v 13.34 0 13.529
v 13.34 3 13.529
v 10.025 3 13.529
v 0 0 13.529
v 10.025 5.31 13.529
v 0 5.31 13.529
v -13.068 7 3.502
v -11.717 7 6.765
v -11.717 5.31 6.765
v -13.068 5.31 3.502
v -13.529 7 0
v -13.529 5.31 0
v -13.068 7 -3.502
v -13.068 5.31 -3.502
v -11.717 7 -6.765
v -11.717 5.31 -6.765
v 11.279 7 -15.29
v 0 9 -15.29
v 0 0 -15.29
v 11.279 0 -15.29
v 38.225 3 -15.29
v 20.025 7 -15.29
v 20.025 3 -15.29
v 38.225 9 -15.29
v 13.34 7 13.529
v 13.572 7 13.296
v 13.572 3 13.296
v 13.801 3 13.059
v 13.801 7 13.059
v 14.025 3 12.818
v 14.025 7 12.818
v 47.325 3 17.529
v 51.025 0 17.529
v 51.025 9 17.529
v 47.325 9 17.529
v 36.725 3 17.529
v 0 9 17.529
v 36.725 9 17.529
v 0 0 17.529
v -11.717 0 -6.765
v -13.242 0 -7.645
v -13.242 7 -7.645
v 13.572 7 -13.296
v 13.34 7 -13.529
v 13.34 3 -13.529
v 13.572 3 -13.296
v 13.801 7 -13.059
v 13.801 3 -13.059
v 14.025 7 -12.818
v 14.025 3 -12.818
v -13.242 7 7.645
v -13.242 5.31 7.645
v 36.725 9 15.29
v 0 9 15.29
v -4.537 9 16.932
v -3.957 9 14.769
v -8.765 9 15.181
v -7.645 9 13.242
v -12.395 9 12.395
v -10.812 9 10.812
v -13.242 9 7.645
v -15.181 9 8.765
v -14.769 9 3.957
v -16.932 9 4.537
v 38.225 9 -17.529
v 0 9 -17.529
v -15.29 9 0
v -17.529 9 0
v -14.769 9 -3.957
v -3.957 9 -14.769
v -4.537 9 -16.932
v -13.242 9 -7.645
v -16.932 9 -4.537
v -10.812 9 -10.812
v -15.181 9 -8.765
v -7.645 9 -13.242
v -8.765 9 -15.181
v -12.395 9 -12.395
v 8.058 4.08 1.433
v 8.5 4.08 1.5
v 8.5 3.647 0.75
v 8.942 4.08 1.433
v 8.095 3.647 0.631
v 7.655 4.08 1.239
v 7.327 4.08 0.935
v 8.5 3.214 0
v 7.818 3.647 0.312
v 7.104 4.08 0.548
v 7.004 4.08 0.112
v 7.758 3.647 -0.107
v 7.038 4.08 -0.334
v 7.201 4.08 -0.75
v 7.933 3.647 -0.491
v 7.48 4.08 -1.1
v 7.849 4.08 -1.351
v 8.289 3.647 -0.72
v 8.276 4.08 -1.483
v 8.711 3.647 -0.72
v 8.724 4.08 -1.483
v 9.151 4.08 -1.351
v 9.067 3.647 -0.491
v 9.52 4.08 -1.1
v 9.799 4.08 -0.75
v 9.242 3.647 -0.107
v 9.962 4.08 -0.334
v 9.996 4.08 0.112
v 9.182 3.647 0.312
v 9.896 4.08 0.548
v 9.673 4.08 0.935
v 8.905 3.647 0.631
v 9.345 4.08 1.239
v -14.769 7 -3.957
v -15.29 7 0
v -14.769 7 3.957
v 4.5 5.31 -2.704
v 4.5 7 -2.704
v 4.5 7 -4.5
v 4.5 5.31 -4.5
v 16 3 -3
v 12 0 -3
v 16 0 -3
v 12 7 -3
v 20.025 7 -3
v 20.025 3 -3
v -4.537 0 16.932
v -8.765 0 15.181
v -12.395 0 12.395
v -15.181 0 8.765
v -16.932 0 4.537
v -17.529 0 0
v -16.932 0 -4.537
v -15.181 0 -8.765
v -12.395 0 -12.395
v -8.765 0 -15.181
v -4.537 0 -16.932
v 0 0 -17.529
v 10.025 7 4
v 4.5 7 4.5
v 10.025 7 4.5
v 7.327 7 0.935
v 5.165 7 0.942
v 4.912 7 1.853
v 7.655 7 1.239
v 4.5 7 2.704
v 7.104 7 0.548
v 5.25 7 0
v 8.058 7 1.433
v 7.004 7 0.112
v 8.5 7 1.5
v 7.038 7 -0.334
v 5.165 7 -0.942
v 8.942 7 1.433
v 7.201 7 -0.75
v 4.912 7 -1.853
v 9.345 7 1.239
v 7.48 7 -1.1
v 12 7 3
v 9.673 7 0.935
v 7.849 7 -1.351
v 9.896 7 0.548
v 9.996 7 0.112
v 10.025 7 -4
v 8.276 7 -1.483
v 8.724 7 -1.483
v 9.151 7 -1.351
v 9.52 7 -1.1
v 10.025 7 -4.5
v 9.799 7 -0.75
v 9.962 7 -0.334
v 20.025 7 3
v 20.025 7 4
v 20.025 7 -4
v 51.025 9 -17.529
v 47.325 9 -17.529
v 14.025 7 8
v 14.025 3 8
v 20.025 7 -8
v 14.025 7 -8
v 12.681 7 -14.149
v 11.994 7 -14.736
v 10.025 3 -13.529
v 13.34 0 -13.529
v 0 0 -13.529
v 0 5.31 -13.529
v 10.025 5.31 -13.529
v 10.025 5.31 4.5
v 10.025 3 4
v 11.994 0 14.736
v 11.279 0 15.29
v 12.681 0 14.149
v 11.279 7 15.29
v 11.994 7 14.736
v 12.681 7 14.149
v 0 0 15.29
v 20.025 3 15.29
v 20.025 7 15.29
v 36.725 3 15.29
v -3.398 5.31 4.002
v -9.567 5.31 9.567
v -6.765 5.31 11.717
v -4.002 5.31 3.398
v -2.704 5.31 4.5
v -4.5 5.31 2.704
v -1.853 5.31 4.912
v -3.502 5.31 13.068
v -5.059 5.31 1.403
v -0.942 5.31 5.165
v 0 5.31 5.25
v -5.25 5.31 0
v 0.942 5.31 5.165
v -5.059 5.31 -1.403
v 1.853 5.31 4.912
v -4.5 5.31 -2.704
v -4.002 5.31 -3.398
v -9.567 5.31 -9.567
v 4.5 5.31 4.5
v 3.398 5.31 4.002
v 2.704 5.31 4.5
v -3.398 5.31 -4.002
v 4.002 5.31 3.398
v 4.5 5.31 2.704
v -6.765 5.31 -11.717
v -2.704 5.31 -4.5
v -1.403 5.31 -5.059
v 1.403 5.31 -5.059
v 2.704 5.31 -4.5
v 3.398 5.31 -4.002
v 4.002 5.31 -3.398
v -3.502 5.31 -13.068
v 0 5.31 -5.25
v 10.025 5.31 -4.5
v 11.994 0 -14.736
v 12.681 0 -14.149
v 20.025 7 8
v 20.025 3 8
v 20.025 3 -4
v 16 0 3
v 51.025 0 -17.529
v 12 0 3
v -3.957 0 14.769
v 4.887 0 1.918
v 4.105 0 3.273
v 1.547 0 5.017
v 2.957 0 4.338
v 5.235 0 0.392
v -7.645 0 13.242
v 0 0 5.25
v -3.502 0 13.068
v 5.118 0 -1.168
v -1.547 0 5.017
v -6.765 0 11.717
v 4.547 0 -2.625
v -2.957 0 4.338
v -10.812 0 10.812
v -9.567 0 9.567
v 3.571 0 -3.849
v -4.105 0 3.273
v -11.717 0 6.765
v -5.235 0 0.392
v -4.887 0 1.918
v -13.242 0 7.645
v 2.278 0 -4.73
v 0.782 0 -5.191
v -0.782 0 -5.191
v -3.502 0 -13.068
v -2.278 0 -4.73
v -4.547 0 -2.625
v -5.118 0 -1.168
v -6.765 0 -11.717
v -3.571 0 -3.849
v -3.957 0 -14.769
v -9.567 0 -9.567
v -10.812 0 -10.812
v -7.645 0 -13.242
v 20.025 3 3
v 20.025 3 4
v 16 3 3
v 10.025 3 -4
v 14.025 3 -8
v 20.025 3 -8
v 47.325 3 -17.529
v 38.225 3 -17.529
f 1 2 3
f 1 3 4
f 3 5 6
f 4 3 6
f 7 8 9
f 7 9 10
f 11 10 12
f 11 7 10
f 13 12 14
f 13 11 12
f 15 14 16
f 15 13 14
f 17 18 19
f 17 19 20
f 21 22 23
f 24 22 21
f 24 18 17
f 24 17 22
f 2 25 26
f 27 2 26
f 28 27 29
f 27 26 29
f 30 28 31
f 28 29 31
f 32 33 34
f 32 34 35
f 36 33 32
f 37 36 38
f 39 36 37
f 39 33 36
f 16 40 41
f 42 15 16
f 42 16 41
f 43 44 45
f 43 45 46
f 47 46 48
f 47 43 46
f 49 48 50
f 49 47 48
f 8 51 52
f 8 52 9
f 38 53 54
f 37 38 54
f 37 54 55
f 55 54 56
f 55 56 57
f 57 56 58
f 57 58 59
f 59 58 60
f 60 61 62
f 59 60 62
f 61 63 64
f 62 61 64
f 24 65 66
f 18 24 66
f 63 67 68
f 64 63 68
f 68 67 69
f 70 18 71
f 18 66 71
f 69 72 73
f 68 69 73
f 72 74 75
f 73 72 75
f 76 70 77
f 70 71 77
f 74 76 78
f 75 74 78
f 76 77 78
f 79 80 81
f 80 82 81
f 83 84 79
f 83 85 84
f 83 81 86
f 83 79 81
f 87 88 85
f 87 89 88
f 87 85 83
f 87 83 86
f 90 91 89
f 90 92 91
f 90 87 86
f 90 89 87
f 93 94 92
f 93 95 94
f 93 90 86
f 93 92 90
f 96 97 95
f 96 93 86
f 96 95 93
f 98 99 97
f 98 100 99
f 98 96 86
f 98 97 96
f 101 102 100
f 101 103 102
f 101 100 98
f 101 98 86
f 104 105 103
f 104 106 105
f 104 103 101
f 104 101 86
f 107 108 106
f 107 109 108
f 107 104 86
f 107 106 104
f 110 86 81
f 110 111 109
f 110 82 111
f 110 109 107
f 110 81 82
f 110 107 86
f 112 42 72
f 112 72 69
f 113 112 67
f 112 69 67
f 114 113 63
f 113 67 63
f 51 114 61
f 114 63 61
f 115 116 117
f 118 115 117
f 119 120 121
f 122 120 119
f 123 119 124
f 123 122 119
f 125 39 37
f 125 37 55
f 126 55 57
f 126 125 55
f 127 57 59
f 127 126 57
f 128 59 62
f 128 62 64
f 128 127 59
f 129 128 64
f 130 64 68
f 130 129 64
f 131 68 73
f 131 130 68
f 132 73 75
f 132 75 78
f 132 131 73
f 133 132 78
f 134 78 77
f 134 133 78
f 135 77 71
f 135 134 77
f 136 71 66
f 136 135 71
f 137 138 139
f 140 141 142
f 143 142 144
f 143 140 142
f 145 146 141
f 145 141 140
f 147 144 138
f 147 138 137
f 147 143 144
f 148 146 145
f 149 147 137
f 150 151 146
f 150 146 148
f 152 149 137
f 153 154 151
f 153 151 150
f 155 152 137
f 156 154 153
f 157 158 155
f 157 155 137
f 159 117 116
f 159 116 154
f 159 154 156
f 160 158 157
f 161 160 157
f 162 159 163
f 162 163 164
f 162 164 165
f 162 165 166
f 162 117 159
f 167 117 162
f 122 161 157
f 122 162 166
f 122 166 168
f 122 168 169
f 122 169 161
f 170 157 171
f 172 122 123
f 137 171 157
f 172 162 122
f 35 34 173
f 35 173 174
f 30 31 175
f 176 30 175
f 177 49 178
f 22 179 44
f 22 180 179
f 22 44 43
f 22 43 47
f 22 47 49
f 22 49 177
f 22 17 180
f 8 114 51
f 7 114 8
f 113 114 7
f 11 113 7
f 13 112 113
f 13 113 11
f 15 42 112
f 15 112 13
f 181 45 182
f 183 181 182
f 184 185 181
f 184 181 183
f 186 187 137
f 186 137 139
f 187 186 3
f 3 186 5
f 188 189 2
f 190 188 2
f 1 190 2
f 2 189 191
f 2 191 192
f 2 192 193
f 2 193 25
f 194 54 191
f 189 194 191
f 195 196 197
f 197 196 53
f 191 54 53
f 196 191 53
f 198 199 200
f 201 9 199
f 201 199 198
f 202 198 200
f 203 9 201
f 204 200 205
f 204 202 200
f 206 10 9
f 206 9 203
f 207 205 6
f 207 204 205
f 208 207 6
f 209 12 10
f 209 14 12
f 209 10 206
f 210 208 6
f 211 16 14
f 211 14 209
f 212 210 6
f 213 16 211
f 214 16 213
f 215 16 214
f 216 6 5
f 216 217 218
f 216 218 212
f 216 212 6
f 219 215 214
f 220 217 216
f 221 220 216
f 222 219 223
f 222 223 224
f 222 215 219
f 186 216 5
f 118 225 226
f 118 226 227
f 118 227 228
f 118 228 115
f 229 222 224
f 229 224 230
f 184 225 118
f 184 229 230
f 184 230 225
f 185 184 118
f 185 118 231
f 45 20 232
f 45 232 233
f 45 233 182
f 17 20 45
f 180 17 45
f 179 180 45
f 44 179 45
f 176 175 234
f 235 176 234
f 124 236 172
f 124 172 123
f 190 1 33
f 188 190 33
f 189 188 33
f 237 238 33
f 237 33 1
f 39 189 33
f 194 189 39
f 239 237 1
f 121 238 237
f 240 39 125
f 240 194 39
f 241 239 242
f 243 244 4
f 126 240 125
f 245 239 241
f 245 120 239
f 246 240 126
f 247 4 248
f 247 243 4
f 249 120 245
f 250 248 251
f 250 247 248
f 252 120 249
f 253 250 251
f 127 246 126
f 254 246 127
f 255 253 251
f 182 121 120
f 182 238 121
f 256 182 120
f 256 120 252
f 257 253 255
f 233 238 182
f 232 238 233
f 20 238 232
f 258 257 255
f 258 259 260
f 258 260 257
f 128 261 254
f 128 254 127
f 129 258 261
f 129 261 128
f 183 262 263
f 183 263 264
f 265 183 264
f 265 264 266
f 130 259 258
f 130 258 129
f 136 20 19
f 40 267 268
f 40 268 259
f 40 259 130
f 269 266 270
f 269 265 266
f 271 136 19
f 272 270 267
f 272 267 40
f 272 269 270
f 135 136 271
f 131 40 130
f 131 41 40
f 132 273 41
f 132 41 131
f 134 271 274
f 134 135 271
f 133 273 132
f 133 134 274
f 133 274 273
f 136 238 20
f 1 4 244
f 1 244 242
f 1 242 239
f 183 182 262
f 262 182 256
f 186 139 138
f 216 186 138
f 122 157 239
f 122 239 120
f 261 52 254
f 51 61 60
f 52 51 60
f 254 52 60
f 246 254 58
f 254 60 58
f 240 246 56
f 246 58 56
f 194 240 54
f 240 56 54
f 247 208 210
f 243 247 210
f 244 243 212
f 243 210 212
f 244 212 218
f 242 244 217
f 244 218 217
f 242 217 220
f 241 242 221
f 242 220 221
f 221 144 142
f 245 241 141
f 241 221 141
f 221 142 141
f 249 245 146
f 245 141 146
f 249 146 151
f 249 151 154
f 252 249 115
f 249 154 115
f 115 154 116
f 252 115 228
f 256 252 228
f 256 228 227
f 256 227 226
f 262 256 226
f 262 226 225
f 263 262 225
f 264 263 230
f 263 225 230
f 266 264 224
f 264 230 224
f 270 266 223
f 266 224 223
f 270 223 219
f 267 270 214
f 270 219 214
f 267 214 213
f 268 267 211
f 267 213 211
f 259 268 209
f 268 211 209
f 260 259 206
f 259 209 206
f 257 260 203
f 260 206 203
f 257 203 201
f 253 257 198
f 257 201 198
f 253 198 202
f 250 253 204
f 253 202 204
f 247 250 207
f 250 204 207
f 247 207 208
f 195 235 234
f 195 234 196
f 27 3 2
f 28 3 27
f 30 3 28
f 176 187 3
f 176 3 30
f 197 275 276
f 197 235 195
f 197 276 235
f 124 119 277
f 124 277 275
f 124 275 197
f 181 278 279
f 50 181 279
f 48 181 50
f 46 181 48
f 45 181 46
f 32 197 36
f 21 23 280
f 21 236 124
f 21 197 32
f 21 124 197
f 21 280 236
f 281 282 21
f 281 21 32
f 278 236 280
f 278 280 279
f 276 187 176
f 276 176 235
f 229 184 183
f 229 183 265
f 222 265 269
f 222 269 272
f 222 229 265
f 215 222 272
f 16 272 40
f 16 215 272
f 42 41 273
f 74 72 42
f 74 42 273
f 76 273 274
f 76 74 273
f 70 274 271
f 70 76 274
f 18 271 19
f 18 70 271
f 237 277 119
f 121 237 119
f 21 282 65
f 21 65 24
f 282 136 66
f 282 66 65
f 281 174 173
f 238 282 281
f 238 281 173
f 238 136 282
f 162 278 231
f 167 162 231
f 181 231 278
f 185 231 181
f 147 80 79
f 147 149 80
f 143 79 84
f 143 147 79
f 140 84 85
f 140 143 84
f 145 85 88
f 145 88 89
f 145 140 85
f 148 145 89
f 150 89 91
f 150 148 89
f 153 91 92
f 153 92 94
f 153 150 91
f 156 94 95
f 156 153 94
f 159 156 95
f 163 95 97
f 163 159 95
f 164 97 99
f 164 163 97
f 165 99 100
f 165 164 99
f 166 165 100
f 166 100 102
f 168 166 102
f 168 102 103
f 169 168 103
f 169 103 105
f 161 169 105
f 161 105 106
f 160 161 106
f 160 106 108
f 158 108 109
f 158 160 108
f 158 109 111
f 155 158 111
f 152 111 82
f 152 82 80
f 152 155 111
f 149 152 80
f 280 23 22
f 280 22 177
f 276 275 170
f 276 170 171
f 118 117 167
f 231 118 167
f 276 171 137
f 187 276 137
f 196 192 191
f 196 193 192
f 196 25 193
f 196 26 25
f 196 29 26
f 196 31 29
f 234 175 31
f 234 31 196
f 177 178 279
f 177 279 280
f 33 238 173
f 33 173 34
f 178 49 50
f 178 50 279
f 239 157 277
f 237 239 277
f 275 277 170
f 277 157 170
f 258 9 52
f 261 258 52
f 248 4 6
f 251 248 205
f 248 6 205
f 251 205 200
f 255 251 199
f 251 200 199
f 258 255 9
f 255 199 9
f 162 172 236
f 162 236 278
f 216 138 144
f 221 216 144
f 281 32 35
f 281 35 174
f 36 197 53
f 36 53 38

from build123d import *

# Parameters (mm, degrees)
SENSOR_BODY_BASE_DEPTH            = 9
CAMERA_HOLE_SKETCH_R              = 5.25
CAMERA_HOLE_DEPTH                 = 55.697637212
COVER_PLATE_CUTOUT_DEPTH          = 2
LED_DRIVER_CUTOUT_DEPTH           = 55.40433362
LED_DRIVER_CUTOUT_DEPTH_BACK      = 4
LEAD_START                        = 55.40433362
LEAD_CUTOUT_DEPTH                 = 62.40433362
FOLDED_LEAD_CUTOUT_DEPTH          = 4
GREEN_LEAD_CUTOUT_SKETCH_W        = 4
GREEN_LEAD_CUTOUT_SKETCH_H        = 6
GREEN_LEAD_CUTOUT_DEPTH           = 55.40433362
FOLDED_GREEN_LEAD_CUTOUT_SKETCH_W = 4.025
FOLDED_GREEN_LEAD_CUTOUT_SKETCH_H = 6
FOLDED_GREEN_LEAD_CUTOUT_DEPTH    = 4
CAMERA_PCB_CUTOUT_DEPTH           = 1.69
COVER_START                       = 1.69
COVER_PLATE_SUPPORT_DEPTH         = 1.69


with BuildPart() as part:
    # Sensor Body Base Sketch → Sensor Body Base (new body)
    with BuildSketch(Plane(origin=(0, 0, 0), x_dir=(1, 0, 0), z_dir=(0, 1, 0))):
        with BuildLine():
            Line((0, 17.5294293), (51.025, 17.5294293))
            Line((51.025, 17.5294293), (51.025, -17.5294293))
            Line((51.025, -17.5294293), (0, -17.5294293))
            ThreePointArc((0, -17.5294293), (-17.5294293, 0), (0, 17.5294293))
        make_face()
    extrude(amount=SENSOR_BODY_BASE_DEPTH)

    # Camera Hole Sketch → Camera Hole (cut, through all)
    with BuildSketch(Plane(origin=(0, 9, 0), x_dir=(1, 0, 0), z_dir=(0, 1, 0))):
        with Locations(Location((0, 0, 0), (0, 0, 270))):
            Circle(CAMERA_HOLE_SKETCH_R)
    extrude(amount=-CAMERA_HOLE_DEPTH, mode=Mode.SUBTRACT)

    # Cover Plate Cutout Sketch → Cover Plate Cutout (cut)
    # profile 1 of 2: a face of its own
    with BuildSketch(Plane(origin=(0, 9, 0), x_dir=(1, 0, 0), z_dir=(0, 1, 0))):
        with BuildLine():
            Line((47.325, 15.29), (0, 15.29))
            ThreePointArc((0, 15.29), (-15.29, 0), (0, -15.29))
            Line((0, -15.29), (47.325, -15.29))
            Line((47.325, -15.29), (47.325, -5.29))
            Line((47.325, -5.29), (47.325, 5.29))
            Line((47.325, 5.29), (47.325, 15.29))
        make_face()
        with BuildLine():
            ThreePointArc((4.308421985, -3), (-5.25, 0), (4.308421985, 3))
            Line((4.308421985, 3), (10.72655949, 3))
            Line((10.72655949, 3), (10.72655949, -3))
            Line((10.72655949, -3), (4.308421985, -3))
        make_face(mode=Mode.SUBTRACT)
    # profile 2 of 2: a face of its own
    with BuildSketch(Plane(origin=(0, 9, 0), x_dir=(1, 0, 0), z_dir=(0, 1, 0))):
        with BuildLine():
            Line((10.72655949, 3), (4.308421985, 3))
            ThreePointArc((4.308421985, 3), (5.009077531, 1.57214576), (5.25, 0))
            ThreePointArc((5.25, 0), (5.009077531, -1.57214576), (4.308421985, -3))
            Line((4.308421985, -3), (10.72655949, -3))
            Line((10.72655949, -3), (10.72655949, 3))
        make_face()
    extrude(amount=-COVER_PLATE_CUTOUT_DEPTH, mode=Mode.SUBTRACT)

    # LED Driver Cutout Sketch → LED Driver Cutout (cut, two sides: drawn at the far end of the back side and taken through both)
    with BuildSketch(Plane(origin=(0, 7, 0), x_dir=(1, 0, 0), z_dir=(0, 1, 0)).offset(-LED_DRIVER_CUTOUT_DEPTH_BACK)):
        Polygon((36.725, -17.5294293), (47.325, -17.5294293), (47.325, 17.5294293), (38.225, 17.5294293), (38.225, 15.29), (20.025, 15.29), (20.025, -15.29), (36.725, -15.29), align=None)
    extrude(amount=LED_DRIVER_CUTOUT_DEPTH + LED_DRIVER_CUTOUT_DEPTH_BACK, mode=Mode.SUBTRACT)

    # Cover Plate Fastener Sketch → Cover Plate Fastener (revolve, cut)
    with BuildSketch(Plane.XY, mode=Mode.PRIVATE) as cover_plate_fastener_sk:
        Polygon((8.5, 7), (8.5, 3.213974596), (10, 4.08), (10, 7), align=None)
    revolve(cover_plate_fastener_sk.sketch.rotate(Axis((8.5, 7, 0), (0, -1, 0)), 90), axis=Axis((8.5, 7, 0), (0, -1, 0)), mode=Mode.SUBTRACT)

    # Lead Cutout Shared Sketch → Lead Cutout (cut)
    with BuildSketch(Plane(origin=(0, 7, 0), x_dir=(1, 0, 0), z_dir=(0, 1, 0)).offset(LEAD_START)):
        with BuildLine():
            ThreePointArc((0, -13.5294293), (-6.76471465, -11.716829473), (-11.716829473, -6.76471465))
            Line((-11.716829473, -6.76471465), (-13.241528424, -7.645))
            ThreePointArc((-13.241528424, -7.645), (-7.645, -13.241528424), (0, -15.29))
            Line((0, -15.29), (11.279002615, -15.29))
            ThreePointArc((11.279002615, -15.29), (12.340917186, -14.446513871), (13.339960375, -13.5294293))
            Line((13.339960375, -13.5294293), (10.025, -13.5294293))
            Line((10.025, -13.5294293), (0, -13.5294293))
        make_face()
    lead_cutout = extrude(amount=-LEAD_CUTOUT_DEPTH, mode=Mode.SUBTRACT)

    # Sketch11<5> → Folded Lead Cutout (cut)
    with BuildSketch(Plane(origin=(0, 7, 0), x_dir=(1, 0, 0), z_dir=(0, 1, 0))):
        with BuildLine():
            Line((10.025, -4), (10.025, -13.5294293))
            Line((10.025, -13.5294293), (13.339960375, -13.5294293))
            ThreePointArc((13.339960375, -13.5294293), (13.687104196, -13.178132597), (14.025, -12.817931775))
            Line((14.025, -12.817931775), (14.025, -8))
            Line((14.025, -8), (20.025, -8))
            Line((20.025, -8), (20.025, -4))
            Line((20.025, -4), (10.025, -4))
        make_face()
    folded_lead_cutout = extrude(amount=-FOLDED_LEAD_CUTOUT_DEPTH, mode=Mode.SUBTRACT)

    # Lead Cutout Mirror: Lead Cutout, Folded Lead Cutout across plane
    add(lead_cutout.mirror(Plane.XY), mode=Mode.SUBTRACT)
    add(folded_lead_cutout.mirror(Plane.XY), mode=Mode.SUBTRACT)

    # Green Lead Cutout Sketch → Green Lead Cutout (cut, through all)
    with BuildSketch(Plane(origin=(0, 7, 0), x_dir=(1, 0, 0), z_dir=(0, 1, 0))):
        with Locations((14, 0)):
            Rectangle(GREEN_LEAD_CUTOUT_SKETCH_W, GREEN_LEAD_CUTOUT_SKETCH_H)
    extrude(amount=-GREEN_LEAD_CUTOUT_DEPTH, mode=Mode.SUBTRACT)

    # Folded Green Lead Cutout Sketch → Folded Green Lead Cutout (cut)
    with BuildSketch(Plane(origin=(0, 7, 0), x_dir=(1, 0, 0), z_dir=(0, 1, 0))):
        with Locations((18.0125, 0)):
            Rectangle(FOLDED_GREEN_LEAD_CUTOUT_SKETCH_W, FOLDED_GREEN_LEAD_CUTOUT_SKETCH_H)
    extrude(amount=-FOLDED_GREEN_LEAD_CUTOUT_DEPTH, mode=Mode.SUBTRACT)

    # Camera PCB Cutout Sketch → Camera PCB Cutout (cut)
    with BuildSketch(Plane(origin=(0, 7, 0), x_dir=(1, 0, 0), z_dir=(0, 1, 0))):
        with BuildLine():
            Line((-11.716829473, 6.76471465), (-13.241528424, 7.645))
            ThreePointArc((-13.241528424, 7.645), (-15.29, 0), (-13.241528424, -7.645))
            Line((-13.241528424, -7.645), (-11.716829473, -6.76471465))
            ThreePointArc((-11.716829473, -6.76471465), (-6.76471465, -11.716829473), (0, -13.5294293))
            Line((0, -13.5294293), (10.025, -13.5294293))
            Line((10.025, -13.5294293), (10.025, -4.5))
            Line((10.025, -4.5), (4.5, -4.5))
            Line((4.5, -4.5), (2.704163457, -4.5))
            ThreePointArc((2.704163457, -4.5), (0, -5.25), (-2.704163457, -4.5))
            Line((-2.704163457, -4.5), (-4.5, -4.5))
            Line((-4.5, -4.5), (-4.5, -2.704163457))
            ThreePointArc((-4.5, -2.704163457), (-5.25, 0), (-4.5, 2.704163457))
            Line((-4.5, 2.704163457), (-4.5, 4.5))
            Line((-4.5, 4.5), (-2.704163457, 4.5))
            ThreePointArc((-2.704163457, 4.5), (0, 5.25), (2.704163457, 4.5))
            Line((2.704163457, 4.5), (4.5, 4.5))
            Line((4.5, 4.5), (10.025, 4.5))
            Line((10.025, 4.5), (10.025, 13.5294293))
            Line((10.025, 13.5294293), (0, 13.5294293))
            ThreePointArc((0, 13.5294293), (-6.76471465, 11.716829473), (-11.716829473, 6.76471465))
        make_face()
        with BuildLine():
            Line((4.5, -4.5), (4.5, -2.704163457))
            ThreePointArc((4.5, -2.704163457), (3.712310601, -3.712310601), (2.704163457, -4.5))
            Line((2.704163457, -4.5), (4.5, -4.5))
        make_face()
        with BuildLine():
            ThreePointArc((-2.704163457, -4.5), (-3.712310601, -3.712310601), (-4.5, -2.704163457))
            Line((-4.5, -2.704163457), (-4.5, -4.5))
            Line((-4.5, -4.5), (-2.704163457, -4.5))
        make_face()
        with BuildLine():
            ThreePointArc((-4.5, 2.704163457), (-3.712310601, 3.712310601), (-2.704163457, 4.5))
            Line((-2.704163457, 4.5), (-4.5, 4.5))
            Line((-4.5, 4.5), (-4.5, 2.704163457))
        make_face()
        with BuildLine():
            Line((4.5, 2.704163457), (4.5, 4.5))
            Line((4.5, 4.5), (2.704163457, 4.5))
            ThreePointArc((2.704163457, 4.5), (3.712310601, 3.712310601), (4.5, 2.704163457))
        make_face()
    extrude(amount=-CAMERA_PCB_CUTOUT_DEPTH, mode=Mode.SUBTRACT)

    # Cover Plate Support Sketch → Cover Plate Support (add)
    with BuildSketch(Plane(origin=(0, 5.31, 0), x_dir=(1, 0, 0), z_dir=(0, 1, 0)).offset(COVER_START)):
        with BuildLine():
            Line((-11.716829473, 6.76471465), (-13.241528424, 7.645))
            ThreePointArc((-13.241528424, 7.645), (-15.29, 0), (-13.241528424, -7.645))
            Line((-13.241528424, -7.645), (-11.716829473, -6.76471465))
            ThreePointArc((-11.716829473, -6.76471465), (-13.5294293, 0), (-11.716829473, 6.76471465))
        make_face()
    extrude(amount=-COVER_PLATE_SUPPORT_DEPTH)


solid = part.part
